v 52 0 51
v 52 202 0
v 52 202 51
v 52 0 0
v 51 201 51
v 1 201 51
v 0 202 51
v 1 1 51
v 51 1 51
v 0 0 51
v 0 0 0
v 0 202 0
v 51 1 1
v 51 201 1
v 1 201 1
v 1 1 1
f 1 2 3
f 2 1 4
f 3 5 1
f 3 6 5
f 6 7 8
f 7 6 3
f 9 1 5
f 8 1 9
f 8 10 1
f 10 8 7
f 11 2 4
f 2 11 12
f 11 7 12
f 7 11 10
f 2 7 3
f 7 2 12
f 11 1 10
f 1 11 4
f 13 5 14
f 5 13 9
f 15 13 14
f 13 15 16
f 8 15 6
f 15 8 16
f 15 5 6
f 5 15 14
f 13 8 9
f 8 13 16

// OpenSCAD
inner_dimensions = true;
box_width = 50.0;
box_height = 50.0;
box_length = 200.0;
wall = 1.0;
units = 1;

module unit(width, lenght, height, wall, inside){
    if (inside == true) {
        difference () {
            cube([width+wall*2, lenght+wall*2, height+wall]);
            translate([wall, wall, wall]) cube([width, lenght, height]);
        }
    }
    else {
        difference() {
            cube([width, lenght, height]);
            translate([wall, wall, wall]) cube([width-wall*2, lenght-wall*2, height-wall]);
        }
    }
}

for (u = [0:units-1]) {
    if (inner_dimensions == true) {
        translate([(wall+box_width) * u, 0, 0]) unit(box_width, box_length, box_height, wall, inner_dimensions);
    }
    else {
        translate([(box_width-wall) * u, 0, 0]) unit(box_width, box_length, box_height, wall, inner_dimensions);
    }  
}
